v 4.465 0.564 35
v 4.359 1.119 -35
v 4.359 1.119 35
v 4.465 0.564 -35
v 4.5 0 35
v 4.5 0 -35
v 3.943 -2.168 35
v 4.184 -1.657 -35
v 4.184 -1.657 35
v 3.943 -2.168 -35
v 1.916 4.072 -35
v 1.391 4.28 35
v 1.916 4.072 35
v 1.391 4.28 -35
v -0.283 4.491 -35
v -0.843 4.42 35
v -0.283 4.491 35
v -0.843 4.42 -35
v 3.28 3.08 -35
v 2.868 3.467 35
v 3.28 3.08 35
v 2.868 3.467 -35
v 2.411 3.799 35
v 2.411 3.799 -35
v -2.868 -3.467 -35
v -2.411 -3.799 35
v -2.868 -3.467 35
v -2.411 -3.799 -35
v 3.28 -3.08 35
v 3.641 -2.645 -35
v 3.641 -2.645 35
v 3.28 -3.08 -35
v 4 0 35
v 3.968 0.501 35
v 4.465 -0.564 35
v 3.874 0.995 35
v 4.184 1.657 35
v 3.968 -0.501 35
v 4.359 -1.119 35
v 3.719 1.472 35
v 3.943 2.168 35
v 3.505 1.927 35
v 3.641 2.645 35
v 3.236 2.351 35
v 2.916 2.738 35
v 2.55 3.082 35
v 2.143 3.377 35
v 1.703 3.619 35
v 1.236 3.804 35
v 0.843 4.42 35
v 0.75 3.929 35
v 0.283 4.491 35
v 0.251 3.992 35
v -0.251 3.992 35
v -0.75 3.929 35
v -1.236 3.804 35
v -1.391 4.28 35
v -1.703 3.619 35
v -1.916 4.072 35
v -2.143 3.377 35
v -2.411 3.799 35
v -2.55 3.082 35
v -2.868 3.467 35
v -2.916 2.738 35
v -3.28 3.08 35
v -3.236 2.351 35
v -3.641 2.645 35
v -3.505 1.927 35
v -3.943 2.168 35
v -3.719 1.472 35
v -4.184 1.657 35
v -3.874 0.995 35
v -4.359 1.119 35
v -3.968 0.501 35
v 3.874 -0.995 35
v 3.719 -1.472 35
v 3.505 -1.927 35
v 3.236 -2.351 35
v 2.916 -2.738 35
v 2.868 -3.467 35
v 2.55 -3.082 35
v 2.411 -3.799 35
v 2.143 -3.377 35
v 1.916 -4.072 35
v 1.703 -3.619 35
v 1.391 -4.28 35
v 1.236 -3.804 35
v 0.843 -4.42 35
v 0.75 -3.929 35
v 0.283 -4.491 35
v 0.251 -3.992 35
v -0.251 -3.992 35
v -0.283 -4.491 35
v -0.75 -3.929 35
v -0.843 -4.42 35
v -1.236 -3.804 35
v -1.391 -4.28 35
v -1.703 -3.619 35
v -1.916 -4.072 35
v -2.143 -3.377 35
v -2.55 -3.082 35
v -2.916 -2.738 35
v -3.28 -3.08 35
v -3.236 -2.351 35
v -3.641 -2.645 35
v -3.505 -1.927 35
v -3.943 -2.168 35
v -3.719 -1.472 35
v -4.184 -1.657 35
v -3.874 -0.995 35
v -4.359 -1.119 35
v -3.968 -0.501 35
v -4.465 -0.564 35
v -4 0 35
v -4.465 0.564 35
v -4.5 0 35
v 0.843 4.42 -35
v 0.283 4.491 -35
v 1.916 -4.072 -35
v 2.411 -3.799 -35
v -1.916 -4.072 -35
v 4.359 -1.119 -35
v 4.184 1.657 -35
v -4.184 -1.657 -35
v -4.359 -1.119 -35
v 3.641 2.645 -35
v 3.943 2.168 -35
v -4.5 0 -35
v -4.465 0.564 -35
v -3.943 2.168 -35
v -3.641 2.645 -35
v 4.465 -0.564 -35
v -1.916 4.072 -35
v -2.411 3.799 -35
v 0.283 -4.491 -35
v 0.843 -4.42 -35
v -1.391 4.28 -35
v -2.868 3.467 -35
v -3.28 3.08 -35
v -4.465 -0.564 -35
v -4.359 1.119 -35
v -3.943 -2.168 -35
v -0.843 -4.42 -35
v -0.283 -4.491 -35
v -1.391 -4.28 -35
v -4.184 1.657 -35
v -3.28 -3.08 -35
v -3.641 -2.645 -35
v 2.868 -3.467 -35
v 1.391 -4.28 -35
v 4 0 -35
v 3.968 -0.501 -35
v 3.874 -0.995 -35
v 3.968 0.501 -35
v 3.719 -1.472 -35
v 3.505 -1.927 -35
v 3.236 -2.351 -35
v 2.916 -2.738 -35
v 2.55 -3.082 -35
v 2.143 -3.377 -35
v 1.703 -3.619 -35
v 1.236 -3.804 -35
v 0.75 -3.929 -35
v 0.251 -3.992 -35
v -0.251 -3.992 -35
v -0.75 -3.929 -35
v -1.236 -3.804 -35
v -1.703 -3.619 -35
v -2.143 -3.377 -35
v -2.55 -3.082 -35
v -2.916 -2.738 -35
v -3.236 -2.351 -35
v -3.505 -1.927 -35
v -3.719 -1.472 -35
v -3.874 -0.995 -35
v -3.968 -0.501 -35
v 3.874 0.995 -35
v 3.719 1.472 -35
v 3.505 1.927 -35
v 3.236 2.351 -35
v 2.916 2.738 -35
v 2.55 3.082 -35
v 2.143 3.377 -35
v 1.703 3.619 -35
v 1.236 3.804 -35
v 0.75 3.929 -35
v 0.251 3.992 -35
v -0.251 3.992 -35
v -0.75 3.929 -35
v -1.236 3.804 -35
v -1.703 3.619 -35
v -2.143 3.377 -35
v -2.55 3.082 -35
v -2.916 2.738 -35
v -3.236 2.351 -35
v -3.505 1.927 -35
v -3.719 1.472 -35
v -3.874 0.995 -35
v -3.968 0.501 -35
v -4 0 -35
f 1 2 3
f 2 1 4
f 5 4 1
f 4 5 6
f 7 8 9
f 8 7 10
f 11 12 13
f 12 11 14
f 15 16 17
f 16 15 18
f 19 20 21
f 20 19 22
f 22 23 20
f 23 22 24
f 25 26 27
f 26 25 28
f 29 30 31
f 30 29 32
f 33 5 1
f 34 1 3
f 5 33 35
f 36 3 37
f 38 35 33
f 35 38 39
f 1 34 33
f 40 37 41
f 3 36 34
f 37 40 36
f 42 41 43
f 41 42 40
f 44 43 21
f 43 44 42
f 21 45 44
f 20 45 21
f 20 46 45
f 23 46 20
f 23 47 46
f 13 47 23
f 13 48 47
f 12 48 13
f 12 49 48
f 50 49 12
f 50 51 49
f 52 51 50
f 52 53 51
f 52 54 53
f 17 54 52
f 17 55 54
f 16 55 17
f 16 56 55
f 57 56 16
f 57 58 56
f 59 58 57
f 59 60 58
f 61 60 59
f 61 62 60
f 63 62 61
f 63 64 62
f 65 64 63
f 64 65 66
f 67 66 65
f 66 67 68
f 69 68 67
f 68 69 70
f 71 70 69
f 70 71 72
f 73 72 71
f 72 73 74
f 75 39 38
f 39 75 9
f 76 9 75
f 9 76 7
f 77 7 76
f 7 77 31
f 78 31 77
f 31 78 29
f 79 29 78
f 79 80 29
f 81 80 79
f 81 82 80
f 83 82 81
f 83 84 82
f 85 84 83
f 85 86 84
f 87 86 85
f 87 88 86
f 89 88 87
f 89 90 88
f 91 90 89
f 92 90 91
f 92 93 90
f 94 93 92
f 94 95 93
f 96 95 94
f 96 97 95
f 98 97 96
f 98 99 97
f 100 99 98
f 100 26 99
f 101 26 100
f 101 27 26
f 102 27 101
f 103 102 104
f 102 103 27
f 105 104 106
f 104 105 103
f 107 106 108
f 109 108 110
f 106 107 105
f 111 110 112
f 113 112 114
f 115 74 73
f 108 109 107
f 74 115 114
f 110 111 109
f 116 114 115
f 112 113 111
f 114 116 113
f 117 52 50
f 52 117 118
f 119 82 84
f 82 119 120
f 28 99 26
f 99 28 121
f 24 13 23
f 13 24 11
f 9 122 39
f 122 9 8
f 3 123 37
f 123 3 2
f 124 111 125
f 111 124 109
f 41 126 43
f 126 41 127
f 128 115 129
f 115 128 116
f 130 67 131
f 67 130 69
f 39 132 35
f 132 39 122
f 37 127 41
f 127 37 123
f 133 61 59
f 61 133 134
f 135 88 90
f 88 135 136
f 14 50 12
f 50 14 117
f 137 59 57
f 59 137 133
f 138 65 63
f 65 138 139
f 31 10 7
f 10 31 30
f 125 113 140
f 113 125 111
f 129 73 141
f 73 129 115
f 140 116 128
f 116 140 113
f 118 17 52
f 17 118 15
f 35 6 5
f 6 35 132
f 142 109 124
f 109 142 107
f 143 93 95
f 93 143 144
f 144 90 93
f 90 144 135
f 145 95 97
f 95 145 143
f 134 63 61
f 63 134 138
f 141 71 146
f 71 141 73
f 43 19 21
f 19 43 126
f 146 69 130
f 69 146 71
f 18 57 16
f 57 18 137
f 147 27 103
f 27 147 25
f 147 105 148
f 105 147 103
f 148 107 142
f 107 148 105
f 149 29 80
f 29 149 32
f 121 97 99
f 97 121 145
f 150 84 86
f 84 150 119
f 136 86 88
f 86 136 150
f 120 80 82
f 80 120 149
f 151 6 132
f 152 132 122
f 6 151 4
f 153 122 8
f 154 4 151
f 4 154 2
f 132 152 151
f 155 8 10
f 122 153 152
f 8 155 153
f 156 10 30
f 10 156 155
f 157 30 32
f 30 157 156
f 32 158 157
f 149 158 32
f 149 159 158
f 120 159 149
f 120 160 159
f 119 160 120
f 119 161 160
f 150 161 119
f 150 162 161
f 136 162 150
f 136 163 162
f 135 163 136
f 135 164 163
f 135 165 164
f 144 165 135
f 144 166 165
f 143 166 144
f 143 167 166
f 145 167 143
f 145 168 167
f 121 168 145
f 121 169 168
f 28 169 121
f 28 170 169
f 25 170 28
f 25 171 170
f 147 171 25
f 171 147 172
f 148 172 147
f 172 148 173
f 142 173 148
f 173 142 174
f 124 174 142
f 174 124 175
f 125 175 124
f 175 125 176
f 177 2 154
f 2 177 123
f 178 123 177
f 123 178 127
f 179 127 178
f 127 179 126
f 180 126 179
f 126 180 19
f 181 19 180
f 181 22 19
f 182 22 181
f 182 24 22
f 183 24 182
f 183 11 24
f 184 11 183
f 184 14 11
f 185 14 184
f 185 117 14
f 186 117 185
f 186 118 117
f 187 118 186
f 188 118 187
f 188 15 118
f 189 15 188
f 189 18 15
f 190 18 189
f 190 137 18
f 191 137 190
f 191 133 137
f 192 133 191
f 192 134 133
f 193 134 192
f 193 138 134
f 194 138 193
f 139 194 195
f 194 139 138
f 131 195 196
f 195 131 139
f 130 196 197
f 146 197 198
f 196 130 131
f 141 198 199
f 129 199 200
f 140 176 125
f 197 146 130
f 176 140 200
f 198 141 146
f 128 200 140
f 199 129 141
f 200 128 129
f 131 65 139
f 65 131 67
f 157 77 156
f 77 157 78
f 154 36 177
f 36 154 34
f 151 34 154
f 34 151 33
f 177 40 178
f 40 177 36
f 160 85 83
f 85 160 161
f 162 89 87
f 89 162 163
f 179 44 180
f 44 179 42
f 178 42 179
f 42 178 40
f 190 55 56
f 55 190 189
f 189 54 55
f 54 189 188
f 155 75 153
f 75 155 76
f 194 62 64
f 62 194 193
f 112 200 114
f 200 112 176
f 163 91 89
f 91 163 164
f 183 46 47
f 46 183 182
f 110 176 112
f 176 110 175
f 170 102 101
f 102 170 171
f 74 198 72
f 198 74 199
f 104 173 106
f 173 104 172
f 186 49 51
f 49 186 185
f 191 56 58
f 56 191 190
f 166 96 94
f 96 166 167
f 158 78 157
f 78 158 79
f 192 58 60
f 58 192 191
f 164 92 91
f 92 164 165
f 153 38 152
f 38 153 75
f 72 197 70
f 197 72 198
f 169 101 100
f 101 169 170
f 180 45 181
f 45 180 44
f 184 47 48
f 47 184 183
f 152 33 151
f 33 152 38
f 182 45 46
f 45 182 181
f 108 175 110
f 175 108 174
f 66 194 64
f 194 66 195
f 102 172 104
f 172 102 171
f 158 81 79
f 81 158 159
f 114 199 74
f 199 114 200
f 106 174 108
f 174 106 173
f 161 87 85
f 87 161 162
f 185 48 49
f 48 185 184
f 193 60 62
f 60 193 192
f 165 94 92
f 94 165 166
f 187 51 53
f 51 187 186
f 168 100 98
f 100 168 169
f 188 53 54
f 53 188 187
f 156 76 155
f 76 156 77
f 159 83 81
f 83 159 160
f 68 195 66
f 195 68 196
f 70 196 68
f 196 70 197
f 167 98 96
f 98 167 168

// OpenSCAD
$fn = 50;


difference() {
	union() {
		translate(v = [0, 0, -35.0000000000]) {
			cylinder(h = 70, r = 4.5000000000);
		}
	}
	union() {
		translate(v = [0, 0, -100.0000000000]) {
			cylinder(h = 200, r = 4.0000000000);
		}
	}
}
